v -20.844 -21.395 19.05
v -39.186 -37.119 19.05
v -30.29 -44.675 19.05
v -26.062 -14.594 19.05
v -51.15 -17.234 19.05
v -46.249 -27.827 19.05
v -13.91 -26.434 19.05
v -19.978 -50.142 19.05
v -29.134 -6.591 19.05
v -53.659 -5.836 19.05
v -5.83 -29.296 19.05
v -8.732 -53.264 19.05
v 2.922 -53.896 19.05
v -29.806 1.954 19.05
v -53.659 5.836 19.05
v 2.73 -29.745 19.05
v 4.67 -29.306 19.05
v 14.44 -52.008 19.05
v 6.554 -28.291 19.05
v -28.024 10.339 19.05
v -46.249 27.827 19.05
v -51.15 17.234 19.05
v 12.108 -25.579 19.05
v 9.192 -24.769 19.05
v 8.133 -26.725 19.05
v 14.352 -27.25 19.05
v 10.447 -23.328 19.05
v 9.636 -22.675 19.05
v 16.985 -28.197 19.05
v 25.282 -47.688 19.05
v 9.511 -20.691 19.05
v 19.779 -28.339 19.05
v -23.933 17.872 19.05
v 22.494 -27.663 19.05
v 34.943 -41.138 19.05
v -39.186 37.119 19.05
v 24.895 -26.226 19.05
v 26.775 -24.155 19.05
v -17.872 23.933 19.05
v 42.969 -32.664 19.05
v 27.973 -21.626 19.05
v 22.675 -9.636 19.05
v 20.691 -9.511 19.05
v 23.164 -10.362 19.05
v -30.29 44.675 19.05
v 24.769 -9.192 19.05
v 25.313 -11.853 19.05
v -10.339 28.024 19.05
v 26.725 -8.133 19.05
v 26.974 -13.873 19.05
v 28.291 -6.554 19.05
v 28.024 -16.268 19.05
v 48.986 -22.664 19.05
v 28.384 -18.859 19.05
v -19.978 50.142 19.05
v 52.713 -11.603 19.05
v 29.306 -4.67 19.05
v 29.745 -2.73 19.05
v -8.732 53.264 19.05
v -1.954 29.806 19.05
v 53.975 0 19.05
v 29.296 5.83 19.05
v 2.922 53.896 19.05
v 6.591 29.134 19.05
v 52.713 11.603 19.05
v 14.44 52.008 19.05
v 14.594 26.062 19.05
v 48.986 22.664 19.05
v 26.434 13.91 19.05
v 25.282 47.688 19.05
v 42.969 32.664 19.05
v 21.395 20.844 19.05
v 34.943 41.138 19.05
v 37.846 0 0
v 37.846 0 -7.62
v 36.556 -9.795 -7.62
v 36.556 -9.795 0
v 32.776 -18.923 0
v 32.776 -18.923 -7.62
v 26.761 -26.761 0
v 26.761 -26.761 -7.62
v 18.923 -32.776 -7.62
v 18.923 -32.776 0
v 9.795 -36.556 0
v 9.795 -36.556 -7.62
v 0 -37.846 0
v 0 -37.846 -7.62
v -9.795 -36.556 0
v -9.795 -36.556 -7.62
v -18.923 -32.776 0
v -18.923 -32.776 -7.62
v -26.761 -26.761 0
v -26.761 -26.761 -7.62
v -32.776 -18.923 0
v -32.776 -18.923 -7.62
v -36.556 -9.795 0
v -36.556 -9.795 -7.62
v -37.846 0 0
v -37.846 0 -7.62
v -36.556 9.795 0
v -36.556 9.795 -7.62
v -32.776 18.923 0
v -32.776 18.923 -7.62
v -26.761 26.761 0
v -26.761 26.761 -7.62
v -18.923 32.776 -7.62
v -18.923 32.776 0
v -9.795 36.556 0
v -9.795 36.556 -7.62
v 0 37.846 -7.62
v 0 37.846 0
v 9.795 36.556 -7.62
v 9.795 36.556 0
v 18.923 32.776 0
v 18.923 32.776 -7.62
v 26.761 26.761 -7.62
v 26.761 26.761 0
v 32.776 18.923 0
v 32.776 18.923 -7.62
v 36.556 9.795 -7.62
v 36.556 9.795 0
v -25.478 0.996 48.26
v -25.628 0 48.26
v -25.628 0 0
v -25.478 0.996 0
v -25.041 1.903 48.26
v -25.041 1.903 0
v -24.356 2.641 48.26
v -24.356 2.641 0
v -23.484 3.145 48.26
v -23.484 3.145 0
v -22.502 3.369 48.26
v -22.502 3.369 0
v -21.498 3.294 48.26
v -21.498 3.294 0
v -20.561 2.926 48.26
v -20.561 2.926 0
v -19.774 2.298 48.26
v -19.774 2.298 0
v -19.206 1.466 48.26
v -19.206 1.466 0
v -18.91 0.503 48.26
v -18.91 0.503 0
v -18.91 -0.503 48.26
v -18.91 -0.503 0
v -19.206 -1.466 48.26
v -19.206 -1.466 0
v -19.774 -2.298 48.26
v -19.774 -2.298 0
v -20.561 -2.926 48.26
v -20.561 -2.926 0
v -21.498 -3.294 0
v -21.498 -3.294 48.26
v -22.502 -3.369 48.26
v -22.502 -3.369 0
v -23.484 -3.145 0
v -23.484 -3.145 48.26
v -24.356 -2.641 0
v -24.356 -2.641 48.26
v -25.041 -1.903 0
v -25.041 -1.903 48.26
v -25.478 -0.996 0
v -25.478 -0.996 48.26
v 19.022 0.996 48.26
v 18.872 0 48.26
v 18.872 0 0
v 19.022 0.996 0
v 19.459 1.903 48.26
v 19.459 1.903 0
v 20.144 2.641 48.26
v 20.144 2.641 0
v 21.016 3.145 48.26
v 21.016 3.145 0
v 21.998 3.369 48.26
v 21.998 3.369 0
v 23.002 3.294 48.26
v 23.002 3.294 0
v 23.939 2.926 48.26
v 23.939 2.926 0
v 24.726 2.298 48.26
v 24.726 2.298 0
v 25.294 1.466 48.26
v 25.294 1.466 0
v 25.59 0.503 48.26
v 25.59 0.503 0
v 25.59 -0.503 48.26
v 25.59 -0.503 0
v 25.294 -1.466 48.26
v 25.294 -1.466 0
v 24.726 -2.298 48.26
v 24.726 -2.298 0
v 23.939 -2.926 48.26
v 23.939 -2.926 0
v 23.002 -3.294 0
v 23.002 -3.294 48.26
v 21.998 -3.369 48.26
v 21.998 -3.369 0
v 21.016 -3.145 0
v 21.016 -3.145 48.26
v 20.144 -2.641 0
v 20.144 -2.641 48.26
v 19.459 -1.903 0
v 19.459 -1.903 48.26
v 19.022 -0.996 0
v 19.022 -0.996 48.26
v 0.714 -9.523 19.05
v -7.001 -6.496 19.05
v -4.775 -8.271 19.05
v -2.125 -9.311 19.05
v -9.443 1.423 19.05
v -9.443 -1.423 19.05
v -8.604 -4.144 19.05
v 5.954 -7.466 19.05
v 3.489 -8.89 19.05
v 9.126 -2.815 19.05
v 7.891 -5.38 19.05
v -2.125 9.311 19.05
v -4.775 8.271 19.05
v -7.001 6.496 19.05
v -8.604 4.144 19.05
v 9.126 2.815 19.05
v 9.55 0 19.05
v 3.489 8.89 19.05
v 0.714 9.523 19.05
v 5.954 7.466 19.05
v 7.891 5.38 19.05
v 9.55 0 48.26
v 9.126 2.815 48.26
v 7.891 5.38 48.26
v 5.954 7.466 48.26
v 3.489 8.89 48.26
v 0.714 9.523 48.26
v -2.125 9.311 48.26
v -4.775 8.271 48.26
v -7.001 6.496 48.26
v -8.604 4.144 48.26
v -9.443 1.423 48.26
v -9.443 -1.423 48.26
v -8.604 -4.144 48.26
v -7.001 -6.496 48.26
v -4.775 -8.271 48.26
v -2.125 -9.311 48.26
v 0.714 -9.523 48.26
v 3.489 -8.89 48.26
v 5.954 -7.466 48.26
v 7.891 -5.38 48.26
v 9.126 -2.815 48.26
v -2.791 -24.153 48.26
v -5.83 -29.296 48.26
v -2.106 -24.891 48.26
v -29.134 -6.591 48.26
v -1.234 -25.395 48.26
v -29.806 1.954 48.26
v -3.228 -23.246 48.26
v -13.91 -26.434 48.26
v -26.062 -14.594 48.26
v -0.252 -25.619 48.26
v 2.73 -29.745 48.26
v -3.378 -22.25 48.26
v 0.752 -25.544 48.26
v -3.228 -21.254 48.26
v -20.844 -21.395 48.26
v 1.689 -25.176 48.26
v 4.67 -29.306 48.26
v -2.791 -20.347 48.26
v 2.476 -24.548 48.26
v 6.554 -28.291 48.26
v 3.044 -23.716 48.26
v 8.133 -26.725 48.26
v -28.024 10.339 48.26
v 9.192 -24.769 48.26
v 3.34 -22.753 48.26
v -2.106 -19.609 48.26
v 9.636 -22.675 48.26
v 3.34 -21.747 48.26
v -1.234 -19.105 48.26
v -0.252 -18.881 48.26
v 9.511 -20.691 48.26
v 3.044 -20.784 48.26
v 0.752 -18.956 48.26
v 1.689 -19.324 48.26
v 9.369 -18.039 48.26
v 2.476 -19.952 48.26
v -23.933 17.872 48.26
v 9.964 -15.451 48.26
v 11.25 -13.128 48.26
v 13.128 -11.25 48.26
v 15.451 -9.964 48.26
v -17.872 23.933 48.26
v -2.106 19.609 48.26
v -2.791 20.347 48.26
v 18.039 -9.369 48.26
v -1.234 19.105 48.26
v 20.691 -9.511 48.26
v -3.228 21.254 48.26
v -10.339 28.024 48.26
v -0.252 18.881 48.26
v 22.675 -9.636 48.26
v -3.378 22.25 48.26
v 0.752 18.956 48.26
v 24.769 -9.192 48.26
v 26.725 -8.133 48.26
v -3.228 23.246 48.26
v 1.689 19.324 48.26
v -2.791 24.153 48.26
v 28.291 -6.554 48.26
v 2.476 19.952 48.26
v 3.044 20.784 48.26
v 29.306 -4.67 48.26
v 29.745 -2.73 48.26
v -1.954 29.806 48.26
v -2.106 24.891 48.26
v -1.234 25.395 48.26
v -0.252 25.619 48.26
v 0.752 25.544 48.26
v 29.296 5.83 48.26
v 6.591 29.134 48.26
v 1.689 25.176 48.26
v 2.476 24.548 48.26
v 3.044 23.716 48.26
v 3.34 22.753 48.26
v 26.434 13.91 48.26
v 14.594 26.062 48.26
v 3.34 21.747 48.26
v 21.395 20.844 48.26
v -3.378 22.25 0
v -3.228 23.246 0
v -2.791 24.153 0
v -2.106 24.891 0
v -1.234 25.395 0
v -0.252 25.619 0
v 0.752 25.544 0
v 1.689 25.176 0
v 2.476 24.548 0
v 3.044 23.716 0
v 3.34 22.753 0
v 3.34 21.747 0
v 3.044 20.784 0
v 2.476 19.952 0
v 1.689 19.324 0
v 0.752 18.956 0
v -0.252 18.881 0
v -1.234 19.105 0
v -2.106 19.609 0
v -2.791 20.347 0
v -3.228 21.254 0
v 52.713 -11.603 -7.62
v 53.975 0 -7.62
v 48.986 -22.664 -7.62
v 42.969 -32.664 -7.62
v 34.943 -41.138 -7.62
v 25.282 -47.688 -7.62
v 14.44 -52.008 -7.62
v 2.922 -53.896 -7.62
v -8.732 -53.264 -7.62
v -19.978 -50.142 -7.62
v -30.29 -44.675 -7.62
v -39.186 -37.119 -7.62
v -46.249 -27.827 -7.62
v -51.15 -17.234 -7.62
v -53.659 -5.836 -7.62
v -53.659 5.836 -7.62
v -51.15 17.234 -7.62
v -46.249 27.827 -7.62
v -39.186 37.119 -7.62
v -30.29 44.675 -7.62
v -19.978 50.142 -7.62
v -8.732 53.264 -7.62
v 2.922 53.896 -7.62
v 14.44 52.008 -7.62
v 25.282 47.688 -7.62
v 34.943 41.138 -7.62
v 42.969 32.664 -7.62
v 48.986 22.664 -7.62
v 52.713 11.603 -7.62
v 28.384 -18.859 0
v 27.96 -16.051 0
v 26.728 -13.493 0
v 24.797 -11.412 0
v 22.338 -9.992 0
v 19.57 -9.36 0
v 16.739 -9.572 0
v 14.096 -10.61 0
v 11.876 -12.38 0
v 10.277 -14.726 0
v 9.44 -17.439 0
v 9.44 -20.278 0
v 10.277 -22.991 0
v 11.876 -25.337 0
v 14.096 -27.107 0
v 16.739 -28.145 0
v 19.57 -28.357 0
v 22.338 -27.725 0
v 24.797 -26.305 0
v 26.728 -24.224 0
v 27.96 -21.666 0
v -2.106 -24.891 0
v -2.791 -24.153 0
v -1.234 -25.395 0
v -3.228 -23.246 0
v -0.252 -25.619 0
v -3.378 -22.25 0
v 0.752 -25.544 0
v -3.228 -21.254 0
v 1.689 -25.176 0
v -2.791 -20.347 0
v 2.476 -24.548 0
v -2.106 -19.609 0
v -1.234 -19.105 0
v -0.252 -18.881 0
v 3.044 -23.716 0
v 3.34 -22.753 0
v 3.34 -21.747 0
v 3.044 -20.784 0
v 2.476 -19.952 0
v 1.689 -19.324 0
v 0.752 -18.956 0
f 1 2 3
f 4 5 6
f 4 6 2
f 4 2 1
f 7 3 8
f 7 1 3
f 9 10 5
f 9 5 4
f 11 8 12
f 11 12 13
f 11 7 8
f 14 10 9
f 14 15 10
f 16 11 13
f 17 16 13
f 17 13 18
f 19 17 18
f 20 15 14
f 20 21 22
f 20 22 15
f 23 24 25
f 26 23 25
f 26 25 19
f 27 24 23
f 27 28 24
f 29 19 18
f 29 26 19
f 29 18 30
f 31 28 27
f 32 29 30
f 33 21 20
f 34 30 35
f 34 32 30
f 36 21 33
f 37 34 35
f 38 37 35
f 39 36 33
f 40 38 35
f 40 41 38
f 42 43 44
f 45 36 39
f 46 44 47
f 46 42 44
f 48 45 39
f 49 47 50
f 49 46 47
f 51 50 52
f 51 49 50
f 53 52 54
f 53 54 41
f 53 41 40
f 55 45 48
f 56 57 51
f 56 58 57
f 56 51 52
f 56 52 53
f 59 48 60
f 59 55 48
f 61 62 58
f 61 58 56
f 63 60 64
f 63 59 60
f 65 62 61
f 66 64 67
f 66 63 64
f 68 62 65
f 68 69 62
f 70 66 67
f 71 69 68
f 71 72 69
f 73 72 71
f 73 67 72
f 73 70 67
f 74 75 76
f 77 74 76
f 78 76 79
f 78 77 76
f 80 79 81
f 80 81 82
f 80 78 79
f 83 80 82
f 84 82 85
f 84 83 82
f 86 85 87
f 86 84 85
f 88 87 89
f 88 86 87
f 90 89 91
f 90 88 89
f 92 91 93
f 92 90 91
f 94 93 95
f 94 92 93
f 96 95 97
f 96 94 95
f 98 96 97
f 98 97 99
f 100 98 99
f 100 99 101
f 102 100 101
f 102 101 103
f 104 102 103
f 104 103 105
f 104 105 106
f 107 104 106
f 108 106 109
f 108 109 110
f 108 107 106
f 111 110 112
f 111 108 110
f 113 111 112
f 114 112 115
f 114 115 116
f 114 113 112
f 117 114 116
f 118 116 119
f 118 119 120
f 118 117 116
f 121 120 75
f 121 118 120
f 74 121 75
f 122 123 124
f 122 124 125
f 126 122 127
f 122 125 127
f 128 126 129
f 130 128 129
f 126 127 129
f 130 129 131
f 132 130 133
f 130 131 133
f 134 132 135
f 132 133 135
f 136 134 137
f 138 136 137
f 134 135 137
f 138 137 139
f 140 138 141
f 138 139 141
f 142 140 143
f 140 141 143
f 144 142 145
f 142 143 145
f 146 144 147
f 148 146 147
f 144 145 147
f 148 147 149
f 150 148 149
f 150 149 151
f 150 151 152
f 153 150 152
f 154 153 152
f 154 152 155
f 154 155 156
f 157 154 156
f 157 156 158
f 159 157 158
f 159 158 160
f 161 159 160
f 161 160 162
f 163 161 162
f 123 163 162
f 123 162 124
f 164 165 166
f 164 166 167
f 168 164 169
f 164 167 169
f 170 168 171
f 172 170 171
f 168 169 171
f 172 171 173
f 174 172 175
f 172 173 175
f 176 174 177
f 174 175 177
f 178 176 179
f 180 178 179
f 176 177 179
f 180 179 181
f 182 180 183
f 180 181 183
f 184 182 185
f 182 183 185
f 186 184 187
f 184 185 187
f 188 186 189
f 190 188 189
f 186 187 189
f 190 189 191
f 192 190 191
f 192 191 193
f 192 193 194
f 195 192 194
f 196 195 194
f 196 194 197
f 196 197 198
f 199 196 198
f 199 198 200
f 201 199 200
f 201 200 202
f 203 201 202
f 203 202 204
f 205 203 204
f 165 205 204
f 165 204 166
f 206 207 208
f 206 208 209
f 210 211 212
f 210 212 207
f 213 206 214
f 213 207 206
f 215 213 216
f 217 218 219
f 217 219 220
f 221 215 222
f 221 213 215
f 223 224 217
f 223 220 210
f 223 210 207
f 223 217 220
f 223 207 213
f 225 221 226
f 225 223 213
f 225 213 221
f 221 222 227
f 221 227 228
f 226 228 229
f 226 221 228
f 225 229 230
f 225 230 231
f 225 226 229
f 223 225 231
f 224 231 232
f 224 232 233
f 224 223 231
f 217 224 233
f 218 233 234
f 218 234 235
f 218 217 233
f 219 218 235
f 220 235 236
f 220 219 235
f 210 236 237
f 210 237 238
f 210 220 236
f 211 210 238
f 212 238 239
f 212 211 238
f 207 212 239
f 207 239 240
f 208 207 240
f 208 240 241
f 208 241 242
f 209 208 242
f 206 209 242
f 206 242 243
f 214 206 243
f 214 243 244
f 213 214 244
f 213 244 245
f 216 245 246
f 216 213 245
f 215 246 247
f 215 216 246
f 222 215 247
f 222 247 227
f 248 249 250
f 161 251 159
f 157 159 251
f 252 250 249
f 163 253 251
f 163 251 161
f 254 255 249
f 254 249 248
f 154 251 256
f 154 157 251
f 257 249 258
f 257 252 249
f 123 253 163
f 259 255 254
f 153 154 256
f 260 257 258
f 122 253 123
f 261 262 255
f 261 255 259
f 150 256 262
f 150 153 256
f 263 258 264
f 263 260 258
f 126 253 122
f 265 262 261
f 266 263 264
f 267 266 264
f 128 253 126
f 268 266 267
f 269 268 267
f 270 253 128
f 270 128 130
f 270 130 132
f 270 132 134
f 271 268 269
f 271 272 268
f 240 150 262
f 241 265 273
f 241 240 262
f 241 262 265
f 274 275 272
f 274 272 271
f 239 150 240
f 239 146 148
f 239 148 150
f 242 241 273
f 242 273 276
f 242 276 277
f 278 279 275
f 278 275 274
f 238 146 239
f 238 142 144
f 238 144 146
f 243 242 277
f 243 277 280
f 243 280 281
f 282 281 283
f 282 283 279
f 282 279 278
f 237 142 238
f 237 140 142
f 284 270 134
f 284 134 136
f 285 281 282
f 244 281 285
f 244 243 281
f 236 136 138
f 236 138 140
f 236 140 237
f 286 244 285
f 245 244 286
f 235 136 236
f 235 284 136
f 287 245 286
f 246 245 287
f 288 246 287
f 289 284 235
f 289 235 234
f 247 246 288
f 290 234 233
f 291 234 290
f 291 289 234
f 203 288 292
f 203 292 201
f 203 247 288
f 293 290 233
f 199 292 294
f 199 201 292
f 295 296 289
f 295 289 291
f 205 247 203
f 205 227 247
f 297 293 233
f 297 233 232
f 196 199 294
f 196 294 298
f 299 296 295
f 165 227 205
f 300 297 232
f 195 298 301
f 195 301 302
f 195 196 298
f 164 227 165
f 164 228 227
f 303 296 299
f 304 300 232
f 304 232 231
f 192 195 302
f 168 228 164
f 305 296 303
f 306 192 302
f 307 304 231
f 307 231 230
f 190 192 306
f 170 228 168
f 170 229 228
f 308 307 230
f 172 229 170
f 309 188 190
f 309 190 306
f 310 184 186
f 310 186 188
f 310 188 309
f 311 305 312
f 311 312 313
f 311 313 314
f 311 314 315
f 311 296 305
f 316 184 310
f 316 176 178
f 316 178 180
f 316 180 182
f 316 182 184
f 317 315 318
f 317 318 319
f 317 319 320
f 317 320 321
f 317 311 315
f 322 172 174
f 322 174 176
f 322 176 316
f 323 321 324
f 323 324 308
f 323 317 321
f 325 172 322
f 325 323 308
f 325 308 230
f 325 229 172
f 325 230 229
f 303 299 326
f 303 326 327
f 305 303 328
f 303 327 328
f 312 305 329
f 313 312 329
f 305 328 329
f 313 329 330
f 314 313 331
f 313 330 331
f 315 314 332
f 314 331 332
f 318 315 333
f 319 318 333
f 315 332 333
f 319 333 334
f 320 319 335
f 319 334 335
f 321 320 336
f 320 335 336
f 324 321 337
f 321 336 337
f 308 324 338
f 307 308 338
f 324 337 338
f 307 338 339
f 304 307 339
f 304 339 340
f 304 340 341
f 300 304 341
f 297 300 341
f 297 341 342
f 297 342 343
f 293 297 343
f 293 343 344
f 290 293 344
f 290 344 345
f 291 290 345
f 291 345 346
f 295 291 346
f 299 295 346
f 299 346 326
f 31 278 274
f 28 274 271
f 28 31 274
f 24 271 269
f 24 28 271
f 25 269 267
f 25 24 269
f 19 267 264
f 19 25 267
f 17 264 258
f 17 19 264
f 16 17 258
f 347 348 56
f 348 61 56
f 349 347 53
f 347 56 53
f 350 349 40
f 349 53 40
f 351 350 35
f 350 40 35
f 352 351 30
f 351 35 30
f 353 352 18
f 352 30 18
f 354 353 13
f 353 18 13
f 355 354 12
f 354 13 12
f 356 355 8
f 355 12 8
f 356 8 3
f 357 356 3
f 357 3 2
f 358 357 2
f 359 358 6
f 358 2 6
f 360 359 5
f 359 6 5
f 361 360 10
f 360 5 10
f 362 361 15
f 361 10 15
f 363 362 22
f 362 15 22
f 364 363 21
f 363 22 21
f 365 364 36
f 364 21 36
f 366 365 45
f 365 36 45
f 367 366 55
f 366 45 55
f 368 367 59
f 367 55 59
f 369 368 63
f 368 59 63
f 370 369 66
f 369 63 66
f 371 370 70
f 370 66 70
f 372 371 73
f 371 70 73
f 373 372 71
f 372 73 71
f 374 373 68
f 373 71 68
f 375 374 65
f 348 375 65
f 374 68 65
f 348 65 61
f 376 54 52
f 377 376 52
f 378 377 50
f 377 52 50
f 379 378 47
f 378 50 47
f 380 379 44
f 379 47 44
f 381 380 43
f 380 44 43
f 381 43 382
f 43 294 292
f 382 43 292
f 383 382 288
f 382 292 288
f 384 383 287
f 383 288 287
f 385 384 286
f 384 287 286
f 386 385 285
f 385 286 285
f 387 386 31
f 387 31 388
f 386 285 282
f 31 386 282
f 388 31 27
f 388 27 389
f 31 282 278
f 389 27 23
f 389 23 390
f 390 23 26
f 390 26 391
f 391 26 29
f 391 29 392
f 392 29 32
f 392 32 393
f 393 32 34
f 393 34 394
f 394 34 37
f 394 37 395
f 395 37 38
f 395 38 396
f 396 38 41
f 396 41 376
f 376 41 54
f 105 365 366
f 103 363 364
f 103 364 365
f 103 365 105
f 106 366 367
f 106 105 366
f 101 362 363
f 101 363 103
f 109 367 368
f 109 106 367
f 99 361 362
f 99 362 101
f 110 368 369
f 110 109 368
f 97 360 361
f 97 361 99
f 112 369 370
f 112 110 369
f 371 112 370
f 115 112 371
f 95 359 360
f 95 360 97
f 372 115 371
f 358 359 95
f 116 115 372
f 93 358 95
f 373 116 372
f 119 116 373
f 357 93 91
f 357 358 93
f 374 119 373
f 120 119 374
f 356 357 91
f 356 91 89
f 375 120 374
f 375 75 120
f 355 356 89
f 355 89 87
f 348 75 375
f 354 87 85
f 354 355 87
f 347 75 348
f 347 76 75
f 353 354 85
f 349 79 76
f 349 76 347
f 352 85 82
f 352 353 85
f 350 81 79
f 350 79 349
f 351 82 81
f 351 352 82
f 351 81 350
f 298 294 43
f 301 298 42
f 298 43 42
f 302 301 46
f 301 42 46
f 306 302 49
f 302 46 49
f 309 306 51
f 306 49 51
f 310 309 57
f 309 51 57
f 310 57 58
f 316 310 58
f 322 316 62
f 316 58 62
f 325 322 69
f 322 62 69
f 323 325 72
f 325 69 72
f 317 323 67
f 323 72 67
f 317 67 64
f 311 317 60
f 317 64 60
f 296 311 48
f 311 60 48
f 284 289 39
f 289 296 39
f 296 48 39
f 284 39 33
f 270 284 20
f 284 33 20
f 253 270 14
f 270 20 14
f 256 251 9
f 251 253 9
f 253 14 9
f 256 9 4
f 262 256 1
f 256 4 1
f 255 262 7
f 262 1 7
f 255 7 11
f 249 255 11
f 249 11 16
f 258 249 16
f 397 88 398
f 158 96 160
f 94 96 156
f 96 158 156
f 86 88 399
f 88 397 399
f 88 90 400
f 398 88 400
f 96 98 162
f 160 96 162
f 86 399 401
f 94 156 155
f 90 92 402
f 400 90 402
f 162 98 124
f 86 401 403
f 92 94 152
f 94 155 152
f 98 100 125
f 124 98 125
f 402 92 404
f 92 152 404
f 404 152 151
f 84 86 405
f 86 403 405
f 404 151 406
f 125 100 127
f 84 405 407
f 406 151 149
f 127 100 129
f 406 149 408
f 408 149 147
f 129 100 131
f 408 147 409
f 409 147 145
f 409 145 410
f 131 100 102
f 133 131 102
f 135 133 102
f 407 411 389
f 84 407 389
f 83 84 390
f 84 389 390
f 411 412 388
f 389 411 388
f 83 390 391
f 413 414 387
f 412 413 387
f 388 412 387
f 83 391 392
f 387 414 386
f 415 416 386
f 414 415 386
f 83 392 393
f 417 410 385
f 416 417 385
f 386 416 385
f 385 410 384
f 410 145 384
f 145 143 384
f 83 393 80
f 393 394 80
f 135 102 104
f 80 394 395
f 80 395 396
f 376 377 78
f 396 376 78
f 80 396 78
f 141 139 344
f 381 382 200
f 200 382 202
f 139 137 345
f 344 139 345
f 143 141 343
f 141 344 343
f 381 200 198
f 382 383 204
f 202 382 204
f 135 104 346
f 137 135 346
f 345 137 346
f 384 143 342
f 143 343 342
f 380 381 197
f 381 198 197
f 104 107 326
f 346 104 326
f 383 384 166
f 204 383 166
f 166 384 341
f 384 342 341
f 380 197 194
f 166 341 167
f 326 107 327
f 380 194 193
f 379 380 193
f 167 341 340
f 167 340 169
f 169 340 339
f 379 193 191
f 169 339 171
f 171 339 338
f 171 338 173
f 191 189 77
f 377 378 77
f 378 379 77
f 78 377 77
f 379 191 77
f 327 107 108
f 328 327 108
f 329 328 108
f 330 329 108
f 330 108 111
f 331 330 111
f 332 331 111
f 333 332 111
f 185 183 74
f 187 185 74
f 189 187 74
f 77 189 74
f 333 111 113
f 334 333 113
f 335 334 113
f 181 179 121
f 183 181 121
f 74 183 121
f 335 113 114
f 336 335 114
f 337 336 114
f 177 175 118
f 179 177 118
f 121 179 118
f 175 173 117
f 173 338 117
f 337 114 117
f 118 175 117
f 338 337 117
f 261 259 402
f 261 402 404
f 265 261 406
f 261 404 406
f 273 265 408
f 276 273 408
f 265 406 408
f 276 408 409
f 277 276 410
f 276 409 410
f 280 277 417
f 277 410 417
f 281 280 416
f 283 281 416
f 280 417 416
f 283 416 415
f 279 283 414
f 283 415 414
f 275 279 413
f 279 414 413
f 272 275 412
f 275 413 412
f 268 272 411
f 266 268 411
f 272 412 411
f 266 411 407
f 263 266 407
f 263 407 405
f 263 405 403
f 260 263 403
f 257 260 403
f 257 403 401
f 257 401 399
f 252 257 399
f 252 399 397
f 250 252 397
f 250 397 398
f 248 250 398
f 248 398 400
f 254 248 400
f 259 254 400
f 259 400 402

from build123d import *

# Parameters (mm, degrees)
F0_R     = 53.975
F1_DEPTH = 19.05
F2_R     = 29.87
F2_R_2   = 9.55
F3_DEPTH = 29.21
F5_D     = 6.7564
F6_R     = 53.975
F6_R_2   = 37.846
F7_DEPTH = 7.62
F8_R     = 9.525
F9_DEPTH = 55.881
F10_R    = 7.62


with BuildPart() as f1:
    # F0 (on Top) → F1 (new body)
    with BuildSketch(Plane.XY):
        Circle(F0_R)
    extrude(amount=F1_DEPTH)

    # F2 (on face) → F3 (join)
    with BuildSketch(Plane.XY.offset(19.05)):
        Circle(F2_R)
        Circle(F2_R_2, mode=Mode.SUBTRACT)
    extrude(amount=F3_DEPTH)

    # F5 (through all)
    with Locations(Plane.XY.offset(48.26)):
        with Locations((-22.25, 0), (0, 22.25), (22.25, 0), (0, -22.25)):
            Hole(F5_D / 2)

    # F6 (on face) → F7 (join)
    with BuildSketch(Plane(origin=(0, 0, 0), x_dir=(1, 0, 0), z_dir=(0, 0, -1))):
        Circle(F6_R)
        Circle(F6_R_2, mode=Mode.SUBTRACT)
    extrude(amount=F7_DEPTH)

    # F8 (on face) → F9 (cut, through all)
    with BuildSketch(Plane.XY.offset(48.26)):
        with Locations((18.8585378542, -18.8585378542)):
            Circle(F8_R)
    extrude(amount=-F9_DEPTH, mode=Mode.SUBTRACT)

    # F10
    f10_edges = [f1.edges().sort_by_distance(p)[0] for p in [
        (26.682506, -13.426122, 33.655),
        (13.426122, -26.682506, 33.655),
    ]]
    fillet(f10_edges, radius=F10_R)


solid = f1.part
